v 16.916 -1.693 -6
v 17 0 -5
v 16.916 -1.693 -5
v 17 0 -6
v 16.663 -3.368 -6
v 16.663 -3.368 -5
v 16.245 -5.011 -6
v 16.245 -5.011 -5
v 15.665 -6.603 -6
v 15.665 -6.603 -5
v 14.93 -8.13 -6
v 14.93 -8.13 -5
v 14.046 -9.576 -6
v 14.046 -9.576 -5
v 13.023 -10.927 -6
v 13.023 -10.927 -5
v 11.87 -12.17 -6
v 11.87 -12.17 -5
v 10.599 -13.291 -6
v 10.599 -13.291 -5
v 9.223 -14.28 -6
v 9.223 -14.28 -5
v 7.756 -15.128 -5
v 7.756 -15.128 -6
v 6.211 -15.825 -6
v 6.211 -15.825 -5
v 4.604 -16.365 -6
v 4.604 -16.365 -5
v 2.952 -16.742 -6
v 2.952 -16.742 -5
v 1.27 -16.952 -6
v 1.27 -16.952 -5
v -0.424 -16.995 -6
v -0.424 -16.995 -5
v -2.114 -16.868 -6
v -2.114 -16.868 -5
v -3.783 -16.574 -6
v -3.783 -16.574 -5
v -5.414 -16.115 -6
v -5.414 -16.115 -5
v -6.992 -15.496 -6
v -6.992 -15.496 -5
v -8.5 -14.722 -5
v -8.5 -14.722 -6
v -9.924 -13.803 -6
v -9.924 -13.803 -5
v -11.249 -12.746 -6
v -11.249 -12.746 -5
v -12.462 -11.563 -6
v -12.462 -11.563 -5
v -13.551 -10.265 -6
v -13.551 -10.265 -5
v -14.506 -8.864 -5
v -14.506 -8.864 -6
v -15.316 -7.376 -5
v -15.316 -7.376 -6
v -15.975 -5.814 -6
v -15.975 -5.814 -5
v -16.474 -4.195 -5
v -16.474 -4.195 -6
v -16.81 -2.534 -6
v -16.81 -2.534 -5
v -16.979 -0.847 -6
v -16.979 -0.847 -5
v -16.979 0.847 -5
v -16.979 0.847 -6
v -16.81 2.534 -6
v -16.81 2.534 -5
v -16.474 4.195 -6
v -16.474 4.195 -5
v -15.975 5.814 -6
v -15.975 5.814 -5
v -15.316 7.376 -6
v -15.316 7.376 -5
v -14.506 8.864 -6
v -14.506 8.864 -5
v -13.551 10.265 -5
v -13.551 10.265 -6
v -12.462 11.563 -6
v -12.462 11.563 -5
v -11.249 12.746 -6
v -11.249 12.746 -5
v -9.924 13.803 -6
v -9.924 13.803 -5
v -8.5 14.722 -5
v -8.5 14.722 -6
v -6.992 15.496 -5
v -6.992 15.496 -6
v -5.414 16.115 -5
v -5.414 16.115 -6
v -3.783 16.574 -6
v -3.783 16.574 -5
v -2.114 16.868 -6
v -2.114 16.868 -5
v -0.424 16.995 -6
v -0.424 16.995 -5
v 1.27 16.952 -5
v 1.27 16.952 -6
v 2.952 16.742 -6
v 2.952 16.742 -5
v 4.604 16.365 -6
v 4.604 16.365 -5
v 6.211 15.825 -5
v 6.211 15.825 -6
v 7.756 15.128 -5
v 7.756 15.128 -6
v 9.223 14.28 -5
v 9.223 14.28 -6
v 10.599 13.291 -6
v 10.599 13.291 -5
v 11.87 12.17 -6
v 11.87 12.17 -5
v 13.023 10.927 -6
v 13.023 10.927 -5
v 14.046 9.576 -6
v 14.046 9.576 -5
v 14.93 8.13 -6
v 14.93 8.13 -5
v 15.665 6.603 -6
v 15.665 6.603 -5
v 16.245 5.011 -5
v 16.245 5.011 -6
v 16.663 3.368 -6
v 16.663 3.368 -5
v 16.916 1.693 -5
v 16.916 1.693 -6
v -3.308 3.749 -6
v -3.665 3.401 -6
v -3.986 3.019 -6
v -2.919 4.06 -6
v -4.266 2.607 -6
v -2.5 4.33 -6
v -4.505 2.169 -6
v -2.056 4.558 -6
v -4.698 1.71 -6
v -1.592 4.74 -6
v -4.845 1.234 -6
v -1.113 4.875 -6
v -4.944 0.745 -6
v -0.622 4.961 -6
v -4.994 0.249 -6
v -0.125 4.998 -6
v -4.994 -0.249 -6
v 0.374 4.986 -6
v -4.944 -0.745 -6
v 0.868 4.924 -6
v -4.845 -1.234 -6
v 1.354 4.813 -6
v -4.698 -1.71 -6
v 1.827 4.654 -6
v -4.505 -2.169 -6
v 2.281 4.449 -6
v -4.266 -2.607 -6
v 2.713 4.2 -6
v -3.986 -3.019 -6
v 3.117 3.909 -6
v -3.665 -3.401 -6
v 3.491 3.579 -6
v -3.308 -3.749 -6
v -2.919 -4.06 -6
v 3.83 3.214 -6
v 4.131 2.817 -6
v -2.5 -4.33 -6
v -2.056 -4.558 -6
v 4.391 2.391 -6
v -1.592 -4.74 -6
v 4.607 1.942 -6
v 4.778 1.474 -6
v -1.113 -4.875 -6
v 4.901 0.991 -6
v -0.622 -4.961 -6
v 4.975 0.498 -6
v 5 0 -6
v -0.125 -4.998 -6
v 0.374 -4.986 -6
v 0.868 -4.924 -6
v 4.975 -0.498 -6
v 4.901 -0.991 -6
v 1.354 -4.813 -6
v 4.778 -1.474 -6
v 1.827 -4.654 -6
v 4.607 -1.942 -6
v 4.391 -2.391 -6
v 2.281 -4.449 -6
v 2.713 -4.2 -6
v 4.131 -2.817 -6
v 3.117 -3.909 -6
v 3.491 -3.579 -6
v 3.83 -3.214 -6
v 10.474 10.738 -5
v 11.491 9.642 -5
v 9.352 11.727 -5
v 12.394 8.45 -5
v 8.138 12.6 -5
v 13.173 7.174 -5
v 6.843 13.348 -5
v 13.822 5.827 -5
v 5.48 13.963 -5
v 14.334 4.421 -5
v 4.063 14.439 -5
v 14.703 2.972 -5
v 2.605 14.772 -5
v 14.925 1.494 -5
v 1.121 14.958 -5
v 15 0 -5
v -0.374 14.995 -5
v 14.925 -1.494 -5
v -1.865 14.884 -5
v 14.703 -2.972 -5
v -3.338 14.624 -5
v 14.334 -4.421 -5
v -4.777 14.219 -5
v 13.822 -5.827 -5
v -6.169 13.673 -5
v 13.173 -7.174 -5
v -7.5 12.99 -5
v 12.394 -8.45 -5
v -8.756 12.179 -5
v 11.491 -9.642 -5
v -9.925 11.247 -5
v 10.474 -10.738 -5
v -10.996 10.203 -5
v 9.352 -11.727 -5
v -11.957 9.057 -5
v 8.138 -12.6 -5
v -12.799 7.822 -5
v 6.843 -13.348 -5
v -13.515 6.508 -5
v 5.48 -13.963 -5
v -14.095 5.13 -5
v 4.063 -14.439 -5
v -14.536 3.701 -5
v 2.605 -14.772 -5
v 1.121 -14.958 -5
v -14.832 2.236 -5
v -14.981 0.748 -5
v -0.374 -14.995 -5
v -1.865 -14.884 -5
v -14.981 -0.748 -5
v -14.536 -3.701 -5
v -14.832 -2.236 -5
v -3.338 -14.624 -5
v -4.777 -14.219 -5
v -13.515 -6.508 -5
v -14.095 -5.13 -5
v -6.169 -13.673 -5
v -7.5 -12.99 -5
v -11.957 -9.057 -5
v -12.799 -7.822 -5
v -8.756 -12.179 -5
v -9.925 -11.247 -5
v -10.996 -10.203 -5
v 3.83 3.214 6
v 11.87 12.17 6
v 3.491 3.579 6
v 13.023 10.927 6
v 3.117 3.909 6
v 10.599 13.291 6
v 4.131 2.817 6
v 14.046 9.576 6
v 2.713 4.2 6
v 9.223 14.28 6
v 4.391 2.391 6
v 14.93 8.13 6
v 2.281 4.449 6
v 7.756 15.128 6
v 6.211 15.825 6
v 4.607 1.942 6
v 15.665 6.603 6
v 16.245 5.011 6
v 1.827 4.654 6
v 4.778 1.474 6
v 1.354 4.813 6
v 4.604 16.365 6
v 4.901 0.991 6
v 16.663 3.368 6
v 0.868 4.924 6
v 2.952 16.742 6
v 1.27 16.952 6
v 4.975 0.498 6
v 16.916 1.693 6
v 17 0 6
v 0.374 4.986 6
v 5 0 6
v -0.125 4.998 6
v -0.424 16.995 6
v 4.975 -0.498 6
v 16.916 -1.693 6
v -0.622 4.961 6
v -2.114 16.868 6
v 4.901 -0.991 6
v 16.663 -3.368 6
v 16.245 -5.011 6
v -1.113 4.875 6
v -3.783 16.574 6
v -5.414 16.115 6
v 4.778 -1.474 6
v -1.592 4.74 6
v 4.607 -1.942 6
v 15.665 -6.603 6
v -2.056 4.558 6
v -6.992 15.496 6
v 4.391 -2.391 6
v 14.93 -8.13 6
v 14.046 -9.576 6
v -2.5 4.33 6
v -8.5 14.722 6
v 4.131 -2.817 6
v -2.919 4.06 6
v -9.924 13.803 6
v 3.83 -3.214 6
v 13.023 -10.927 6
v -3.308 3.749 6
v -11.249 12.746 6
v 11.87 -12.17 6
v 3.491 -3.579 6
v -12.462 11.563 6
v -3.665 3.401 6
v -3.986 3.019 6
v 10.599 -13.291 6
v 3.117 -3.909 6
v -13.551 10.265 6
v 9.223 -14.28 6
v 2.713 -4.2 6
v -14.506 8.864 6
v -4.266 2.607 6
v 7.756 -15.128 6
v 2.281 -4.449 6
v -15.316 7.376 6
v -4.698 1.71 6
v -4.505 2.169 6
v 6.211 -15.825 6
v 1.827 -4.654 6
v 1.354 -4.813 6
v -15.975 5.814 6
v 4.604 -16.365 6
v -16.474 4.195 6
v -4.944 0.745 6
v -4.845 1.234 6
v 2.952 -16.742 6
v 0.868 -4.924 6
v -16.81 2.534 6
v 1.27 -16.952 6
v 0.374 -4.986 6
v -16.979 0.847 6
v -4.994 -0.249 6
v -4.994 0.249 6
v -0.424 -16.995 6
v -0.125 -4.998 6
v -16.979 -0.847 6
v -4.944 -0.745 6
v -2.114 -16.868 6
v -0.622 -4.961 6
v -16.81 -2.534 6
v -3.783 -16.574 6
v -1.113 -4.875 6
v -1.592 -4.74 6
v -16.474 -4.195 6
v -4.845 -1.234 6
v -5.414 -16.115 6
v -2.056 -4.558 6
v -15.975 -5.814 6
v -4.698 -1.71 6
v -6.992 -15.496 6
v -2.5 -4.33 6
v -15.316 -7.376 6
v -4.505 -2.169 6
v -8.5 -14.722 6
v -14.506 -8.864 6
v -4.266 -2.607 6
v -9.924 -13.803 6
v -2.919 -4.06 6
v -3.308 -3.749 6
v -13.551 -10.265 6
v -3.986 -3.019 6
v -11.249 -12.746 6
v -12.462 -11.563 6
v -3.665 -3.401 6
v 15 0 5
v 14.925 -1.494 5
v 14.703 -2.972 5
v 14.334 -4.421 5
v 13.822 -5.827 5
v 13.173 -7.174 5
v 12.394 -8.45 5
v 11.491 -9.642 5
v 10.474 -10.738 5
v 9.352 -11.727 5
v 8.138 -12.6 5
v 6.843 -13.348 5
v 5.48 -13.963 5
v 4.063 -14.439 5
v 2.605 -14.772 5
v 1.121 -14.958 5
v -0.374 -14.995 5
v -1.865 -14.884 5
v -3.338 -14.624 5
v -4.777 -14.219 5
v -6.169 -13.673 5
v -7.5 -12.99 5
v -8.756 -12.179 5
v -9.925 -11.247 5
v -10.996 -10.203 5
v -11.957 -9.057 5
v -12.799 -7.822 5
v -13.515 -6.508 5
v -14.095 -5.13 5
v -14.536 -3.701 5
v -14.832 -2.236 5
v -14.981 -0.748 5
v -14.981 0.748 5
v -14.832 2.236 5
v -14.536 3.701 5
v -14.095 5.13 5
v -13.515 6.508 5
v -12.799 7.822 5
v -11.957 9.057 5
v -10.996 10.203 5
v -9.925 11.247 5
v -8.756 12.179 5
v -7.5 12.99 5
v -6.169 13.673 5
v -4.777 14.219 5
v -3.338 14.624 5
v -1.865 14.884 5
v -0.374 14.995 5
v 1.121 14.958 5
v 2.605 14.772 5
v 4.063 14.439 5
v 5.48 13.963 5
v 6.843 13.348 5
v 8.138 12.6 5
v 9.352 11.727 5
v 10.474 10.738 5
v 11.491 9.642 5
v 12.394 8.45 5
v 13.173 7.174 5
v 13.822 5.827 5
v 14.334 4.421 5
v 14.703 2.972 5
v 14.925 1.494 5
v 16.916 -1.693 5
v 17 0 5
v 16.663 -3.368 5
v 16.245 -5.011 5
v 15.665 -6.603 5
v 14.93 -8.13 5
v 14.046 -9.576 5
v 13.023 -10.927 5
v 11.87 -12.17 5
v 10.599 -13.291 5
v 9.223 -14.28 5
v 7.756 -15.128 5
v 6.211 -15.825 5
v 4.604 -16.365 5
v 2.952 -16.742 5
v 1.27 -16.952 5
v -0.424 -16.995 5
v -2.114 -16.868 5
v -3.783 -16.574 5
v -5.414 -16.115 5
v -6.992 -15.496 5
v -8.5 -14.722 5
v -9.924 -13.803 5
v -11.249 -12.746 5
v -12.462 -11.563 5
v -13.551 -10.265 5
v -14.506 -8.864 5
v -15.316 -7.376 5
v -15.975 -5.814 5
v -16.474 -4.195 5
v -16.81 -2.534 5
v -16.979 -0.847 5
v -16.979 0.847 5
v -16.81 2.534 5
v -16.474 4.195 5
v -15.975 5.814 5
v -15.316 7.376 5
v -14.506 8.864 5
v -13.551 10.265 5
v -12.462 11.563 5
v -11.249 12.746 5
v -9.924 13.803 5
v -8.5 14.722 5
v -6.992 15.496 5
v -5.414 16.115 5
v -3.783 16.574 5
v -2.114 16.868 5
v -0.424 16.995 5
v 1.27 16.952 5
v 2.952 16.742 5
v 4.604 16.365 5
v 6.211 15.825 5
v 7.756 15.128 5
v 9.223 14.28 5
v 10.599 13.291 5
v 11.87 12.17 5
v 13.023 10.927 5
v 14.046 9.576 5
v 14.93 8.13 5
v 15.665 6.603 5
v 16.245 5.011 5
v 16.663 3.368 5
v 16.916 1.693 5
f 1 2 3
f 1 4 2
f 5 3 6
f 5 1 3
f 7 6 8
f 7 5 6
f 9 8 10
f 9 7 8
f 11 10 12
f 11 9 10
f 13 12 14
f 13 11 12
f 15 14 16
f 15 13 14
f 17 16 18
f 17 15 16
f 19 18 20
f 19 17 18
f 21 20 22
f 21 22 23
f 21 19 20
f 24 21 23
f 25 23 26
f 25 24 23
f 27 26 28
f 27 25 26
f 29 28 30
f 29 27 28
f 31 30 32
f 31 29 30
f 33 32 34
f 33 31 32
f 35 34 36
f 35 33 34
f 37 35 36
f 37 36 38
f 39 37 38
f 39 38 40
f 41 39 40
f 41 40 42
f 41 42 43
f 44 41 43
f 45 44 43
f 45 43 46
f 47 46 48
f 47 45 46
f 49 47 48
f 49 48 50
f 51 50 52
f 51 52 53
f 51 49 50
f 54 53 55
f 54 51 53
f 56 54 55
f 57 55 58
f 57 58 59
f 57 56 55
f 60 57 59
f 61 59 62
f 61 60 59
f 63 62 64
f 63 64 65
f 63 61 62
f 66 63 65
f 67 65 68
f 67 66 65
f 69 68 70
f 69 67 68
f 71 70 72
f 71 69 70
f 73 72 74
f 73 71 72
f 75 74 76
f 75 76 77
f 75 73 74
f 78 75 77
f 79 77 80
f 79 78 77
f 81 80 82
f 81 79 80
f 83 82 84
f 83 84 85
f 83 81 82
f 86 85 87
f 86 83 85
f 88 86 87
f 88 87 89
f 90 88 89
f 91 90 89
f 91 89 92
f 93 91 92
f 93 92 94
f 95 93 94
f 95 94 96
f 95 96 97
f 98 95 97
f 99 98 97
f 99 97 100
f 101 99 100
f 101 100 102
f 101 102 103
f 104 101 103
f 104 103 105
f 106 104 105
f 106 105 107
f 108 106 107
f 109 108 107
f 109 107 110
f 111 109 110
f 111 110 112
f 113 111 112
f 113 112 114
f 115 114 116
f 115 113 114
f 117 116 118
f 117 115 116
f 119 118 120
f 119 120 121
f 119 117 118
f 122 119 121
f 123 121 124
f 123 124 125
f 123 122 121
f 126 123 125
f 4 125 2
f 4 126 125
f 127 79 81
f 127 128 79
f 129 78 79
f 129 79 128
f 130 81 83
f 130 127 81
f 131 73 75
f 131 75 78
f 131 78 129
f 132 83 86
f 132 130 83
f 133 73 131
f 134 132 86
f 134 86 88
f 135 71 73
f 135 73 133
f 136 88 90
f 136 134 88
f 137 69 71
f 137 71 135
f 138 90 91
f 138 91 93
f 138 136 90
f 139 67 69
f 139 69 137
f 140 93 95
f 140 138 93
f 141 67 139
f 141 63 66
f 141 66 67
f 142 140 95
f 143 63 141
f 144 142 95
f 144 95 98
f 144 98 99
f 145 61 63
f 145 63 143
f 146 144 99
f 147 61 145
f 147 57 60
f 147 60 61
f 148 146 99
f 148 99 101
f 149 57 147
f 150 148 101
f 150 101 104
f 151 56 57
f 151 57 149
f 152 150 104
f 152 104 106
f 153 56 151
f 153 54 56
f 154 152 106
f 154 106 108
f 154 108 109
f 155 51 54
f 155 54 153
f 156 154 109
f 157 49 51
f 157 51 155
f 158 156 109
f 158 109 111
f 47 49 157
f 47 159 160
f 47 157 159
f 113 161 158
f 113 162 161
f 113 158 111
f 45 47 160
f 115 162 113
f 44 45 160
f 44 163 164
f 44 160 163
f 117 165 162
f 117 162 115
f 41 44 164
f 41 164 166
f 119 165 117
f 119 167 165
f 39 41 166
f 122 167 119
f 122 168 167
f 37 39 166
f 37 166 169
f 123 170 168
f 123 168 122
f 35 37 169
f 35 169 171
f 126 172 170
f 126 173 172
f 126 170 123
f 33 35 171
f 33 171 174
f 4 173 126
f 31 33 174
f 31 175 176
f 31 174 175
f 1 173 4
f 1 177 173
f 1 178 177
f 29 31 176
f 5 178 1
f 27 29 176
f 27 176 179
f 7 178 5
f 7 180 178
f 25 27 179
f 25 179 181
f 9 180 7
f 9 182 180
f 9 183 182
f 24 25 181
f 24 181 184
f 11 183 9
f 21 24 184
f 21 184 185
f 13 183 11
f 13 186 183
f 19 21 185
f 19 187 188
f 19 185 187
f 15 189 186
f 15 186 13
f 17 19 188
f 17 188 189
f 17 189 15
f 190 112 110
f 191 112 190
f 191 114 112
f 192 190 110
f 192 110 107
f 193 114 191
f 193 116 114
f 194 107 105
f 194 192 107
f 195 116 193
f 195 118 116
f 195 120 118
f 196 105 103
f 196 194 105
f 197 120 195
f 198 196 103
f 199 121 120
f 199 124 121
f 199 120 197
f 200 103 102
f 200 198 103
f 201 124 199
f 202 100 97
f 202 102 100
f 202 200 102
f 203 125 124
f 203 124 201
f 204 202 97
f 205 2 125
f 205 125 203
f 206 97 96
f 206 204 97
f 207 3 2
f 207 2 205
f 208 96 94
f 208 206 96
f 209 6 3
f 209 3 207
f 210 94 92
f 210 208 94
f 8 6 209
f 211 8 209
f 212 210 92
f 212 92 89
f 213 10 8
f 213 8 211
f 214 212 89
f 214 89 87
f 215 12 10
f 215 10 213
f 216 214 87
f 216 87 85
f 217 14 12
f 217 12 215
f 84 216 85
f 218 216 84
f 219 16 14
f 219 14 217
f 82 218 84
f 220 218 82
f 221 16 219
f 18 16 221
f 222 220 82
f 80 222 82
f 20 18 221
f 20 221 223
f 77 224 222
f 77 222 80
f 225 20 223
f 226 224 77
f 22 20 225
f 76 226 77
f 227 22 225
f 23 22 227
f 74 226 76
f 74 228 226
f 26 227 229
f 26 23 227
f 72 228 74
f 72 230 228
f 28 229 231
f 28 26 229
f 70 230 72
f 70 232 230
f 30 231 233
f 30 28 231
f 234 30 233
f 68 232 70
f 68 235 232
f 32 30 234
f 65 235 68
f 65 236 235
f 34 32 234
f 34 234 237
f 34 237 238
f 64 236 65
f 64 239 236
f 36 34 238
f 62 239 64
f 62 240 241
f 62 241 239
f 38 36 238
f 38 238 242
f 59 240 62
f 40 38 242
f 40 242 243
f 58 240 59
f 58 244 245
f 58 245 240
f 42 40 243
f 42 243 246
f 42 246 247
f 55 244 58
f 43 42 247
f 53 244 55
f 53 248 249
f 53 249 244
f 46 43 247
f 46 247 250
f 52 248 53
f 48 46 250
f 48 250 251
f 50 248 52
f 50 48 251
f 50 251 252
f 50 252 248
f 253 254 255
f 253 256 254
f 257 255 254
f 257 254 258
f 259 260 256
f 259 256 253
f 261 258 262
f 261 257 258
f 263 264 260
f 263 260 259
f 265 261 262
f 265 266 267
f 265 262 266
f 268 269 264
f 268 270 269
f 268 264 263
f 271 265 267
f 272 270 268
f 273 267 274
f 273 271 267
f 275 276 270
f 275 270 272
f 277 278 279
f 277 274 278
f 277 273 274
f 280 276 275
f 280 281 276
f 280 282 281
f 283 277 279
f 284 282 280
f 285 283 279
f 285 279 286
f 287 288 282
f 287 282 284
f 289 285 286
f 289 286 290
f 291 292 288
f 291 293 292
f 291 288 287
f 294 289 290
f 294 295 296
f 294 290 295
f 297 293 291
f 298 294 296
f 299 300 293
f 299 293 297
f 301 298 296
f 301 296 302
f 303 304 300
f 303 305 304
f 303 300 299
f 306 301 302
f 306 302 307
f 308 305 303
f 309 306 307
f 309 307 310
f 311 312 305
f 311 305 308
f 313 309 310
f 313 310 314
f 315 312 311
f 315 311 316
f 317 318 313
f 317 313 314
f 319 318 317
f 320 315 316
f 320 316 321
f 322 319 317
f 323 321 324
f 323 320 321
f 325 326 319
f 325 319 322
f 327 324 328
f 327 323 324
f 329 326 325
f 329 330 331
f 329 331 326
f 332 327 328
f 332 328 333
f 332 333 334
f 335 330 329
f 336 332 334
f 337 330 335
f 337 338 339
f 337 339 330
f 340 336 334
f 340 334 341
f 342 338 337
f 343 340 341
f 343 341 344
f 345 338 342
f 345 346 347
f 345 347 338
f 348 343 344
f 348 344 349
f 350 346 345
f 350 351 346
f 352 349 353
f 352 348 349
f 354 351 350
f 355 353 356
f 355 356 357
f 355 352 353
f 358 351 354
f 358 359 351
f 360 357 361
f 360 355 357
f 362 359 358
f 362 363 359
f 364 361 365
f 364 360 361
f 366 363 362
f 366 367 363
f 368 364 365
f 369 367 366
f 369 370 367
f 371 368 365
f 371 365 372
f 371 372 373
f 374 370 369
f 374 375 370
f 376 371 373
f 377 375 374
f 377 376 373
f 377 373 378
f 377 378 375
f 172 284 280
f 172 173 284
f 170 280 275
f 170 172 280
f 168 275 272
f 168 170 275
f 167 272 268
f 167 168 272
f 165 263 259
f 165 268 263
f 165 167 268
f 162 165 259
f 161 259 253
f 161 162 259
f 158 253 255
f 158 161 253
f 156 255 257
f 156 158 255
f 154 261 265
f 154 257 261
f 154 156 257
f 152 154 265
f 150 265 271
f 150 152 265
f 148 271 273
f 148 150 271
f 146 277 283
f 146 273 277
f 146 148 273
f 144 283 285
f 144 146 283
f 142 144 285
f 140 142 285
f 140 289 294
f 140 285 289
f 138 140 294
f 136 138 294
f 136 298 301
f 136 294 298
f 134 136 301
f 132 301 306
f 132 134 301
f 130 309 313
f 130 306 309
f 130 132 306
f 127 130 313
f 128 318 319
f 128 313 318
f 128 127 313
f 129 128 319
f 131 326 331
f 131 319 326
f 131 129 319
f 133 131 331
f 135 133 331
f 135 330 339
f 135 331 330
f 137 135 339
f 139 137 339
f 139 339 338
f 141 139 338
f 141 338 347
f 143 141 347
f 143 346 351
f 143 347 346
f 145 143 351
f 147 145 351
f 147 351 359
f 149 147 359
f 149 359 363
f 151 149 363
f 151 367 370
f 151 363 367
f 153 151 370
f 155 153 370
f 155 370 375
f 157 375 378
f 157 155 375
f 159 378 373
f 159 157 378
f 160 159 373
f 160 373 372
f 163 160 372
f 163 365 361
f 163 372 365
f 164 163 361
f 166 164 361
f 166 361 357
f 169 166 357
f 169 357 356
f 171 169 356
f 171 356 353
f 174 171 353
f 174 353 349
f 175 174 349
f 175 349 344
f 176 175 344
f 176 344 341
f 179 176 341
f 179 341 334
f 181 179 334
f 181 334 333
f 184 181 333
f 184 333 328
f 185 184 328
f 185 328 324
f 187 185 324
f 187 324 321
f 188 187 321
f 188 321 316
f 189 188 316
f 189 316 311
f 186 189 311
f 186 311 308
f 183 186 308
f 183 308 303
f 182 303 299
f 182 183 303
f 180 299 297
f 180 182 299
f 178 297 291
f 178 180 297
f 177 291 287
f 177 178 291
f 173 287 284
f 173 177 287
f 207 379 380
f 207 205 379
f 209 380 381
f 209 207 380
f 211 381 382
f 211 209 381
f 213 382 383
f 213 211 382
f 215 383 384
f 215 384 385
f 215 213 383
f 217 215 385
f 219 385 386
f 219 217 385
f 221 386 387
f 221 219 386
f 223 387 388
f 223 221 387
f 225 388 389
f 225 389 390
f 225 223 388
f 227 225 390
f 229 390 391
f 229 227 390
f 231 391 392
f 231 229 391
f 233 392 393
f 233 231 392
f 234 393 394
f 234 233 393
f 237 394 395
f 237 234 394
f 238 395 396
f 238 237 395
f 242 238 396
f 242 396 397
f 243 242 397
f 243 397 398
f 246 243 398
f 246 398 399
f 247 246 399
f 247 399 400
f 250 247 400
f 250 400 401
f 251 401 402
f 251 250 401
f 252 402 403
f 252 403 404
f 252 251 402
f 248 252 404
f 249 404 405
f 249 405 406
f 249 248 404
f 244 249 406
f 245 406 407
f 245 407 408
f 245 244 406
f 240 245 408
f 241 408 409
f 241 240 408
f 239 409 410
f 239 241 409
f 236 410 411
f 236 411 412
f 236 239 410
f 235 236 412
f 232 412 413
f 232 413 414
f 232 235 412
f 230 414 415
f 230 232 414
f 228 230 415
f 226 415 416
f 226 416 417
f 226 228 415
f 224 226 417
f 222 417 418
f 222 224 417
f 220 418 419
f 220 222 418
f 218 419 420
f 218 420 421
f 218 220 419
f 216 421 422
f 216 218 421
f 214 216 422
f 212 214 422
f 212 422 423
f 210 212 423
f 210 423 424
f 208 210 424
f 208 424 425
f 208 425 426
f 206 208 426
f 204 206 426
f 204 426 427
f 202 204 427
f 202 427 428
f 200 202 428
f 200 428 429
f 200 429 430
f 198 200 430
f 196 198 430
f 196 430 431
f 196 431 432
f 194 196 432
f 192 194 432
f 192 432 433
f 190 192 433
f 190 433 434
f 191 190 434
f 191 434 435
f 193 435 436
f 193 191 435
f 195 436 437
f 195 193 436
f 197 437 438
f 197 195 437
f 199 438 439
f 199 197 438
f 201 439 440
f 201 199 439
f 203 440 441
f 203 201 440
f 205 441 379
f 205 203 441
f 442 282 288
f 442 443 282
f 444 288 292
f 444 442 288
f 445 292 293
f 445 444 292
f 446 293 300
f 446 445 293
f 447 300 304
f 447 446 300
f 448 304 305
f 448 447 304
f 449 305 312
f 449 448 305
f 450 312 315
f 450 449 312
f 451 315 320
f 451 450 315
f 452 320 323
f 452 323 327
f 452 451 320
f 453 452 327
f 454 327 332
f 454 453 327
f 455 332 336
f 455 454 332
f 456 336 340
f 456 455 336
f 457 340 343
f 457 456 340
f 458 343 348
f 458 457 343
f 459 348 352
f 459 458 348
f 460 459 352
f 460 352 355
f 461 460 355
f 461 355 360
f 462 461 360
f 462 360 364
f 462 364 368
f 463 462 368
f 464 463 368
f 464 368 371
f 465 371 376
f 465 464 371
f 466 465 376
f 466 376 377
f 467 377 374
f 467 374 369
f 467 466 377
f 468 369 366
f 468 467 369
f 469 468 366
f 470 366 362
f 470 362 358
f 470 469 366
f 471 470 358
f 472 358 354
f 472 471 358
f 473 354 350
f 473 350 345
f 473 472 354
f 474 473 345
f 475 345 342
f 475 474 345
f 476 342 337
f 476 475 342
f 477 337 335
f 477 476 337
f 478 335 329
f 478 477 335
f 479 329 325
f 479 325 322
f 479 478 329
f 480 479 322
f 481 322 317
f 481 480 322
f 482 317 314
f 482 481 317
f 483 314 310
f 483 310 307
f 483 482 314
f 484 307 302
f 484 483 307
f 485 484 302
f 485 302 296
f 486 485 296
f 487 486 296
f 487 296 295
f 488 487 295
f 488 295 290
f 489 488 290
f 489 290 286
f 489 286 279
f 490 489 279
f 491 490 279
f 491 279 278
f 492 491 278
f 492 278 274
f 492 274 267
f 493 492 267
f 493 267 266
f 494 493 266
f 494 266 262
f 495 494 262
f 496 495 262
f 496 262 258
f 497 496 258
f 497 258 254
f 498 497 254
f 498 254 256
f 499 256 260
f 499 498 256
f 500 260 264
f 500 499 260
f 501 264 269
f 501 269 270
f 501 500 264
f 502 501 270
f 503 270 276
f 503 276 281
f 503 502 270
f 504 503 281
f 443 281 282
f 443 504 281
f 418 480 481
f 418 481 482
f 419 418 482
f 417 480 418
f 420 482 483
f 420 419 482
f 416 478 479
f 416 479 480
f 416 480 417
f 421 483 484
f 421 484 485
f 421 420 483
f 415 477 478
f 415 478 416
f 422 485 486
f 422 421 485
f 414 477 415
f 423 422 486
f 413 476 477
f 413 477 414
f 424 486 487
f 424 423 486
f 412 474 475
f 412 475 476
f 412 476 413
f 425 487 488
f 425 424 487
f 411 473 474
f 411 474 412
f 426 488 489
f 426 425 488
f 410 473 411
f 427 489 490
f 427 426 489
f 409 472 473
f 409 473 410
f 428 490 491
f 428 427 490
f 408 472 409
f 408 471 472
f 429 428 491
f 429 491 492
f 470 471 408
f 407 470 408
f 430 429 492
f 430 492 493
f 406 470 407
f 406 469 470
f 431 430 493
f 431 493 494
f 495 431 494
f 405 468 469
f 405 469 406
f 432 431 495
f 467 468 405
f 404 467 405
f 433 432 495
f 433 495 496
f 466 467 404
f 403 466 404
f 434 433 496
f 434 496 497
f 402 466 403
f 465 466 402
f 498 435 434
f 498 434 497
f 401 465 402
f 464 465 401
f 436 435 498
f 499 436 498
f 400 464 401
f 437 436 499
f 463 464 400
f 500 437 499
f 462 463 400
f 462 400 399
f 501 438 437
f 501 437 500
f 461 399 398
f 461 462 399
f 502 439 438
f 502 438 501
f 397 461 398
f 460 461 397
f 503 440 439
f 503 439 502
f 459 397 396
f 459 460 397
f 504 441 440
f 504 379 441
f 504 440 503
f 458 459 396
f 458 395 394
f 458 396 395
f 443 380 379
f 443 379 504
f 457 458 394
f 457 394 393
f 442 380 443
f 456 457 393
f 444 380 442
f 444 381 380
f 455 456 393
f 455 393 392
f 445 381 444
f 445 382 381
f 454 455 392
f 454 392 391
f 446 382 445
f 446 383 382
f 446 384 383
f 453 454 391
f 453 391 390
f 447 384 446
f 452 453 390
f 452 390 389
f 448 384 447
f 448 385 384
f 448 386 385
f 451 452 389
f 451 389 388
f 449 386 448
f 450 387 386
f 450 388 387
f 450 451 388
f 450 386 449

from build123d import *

# Parameters (mm, degrees)
CUT_EXTRUDE1_DEPTH      = 25.779023387
CUT_EXTRUDE1_DEPTH_BACK = 25.779023387
SKETCH3_R               = 5


with BuildPart() as part:
    # Sketch1 → Revolve1 (revolve)
    with BuildSketch(Plane(origin=(0, 0, 0), x_dir=(0, 0, -1), z_dir=(1, 0, 0)), mode=Mode.PRIVATE) as revolve1_sk:
        Polygon((-5, 17), (-5, 15), (5, 15), (5, 17), (6, 17), (6, 0), (-6, 0), (-6, 17), align=None)
    revolve(revolve1_sk.sketch.rotate(Axis((0, 0, 6), (0, 0, -1)), 90), axis=Axis((0, 0, 6), (0, 0, -1)))

    # Sketch3 → Cut-Extrude1 (cut, two sides: drawn at the far end of the back side and taken through both)
    with BuildSketch(Plane.XY.offset(-CUT_EXTRUDE1_DEPTH_BACK)):
        Circle(SKETCH3_R)
    extrude(amount=CUT_EXTRUDE1_DEPTH + CUT_EXTRUDE1_DEPTH_BACK, mode=Mode.SUBTRACT)


solid = part.part
